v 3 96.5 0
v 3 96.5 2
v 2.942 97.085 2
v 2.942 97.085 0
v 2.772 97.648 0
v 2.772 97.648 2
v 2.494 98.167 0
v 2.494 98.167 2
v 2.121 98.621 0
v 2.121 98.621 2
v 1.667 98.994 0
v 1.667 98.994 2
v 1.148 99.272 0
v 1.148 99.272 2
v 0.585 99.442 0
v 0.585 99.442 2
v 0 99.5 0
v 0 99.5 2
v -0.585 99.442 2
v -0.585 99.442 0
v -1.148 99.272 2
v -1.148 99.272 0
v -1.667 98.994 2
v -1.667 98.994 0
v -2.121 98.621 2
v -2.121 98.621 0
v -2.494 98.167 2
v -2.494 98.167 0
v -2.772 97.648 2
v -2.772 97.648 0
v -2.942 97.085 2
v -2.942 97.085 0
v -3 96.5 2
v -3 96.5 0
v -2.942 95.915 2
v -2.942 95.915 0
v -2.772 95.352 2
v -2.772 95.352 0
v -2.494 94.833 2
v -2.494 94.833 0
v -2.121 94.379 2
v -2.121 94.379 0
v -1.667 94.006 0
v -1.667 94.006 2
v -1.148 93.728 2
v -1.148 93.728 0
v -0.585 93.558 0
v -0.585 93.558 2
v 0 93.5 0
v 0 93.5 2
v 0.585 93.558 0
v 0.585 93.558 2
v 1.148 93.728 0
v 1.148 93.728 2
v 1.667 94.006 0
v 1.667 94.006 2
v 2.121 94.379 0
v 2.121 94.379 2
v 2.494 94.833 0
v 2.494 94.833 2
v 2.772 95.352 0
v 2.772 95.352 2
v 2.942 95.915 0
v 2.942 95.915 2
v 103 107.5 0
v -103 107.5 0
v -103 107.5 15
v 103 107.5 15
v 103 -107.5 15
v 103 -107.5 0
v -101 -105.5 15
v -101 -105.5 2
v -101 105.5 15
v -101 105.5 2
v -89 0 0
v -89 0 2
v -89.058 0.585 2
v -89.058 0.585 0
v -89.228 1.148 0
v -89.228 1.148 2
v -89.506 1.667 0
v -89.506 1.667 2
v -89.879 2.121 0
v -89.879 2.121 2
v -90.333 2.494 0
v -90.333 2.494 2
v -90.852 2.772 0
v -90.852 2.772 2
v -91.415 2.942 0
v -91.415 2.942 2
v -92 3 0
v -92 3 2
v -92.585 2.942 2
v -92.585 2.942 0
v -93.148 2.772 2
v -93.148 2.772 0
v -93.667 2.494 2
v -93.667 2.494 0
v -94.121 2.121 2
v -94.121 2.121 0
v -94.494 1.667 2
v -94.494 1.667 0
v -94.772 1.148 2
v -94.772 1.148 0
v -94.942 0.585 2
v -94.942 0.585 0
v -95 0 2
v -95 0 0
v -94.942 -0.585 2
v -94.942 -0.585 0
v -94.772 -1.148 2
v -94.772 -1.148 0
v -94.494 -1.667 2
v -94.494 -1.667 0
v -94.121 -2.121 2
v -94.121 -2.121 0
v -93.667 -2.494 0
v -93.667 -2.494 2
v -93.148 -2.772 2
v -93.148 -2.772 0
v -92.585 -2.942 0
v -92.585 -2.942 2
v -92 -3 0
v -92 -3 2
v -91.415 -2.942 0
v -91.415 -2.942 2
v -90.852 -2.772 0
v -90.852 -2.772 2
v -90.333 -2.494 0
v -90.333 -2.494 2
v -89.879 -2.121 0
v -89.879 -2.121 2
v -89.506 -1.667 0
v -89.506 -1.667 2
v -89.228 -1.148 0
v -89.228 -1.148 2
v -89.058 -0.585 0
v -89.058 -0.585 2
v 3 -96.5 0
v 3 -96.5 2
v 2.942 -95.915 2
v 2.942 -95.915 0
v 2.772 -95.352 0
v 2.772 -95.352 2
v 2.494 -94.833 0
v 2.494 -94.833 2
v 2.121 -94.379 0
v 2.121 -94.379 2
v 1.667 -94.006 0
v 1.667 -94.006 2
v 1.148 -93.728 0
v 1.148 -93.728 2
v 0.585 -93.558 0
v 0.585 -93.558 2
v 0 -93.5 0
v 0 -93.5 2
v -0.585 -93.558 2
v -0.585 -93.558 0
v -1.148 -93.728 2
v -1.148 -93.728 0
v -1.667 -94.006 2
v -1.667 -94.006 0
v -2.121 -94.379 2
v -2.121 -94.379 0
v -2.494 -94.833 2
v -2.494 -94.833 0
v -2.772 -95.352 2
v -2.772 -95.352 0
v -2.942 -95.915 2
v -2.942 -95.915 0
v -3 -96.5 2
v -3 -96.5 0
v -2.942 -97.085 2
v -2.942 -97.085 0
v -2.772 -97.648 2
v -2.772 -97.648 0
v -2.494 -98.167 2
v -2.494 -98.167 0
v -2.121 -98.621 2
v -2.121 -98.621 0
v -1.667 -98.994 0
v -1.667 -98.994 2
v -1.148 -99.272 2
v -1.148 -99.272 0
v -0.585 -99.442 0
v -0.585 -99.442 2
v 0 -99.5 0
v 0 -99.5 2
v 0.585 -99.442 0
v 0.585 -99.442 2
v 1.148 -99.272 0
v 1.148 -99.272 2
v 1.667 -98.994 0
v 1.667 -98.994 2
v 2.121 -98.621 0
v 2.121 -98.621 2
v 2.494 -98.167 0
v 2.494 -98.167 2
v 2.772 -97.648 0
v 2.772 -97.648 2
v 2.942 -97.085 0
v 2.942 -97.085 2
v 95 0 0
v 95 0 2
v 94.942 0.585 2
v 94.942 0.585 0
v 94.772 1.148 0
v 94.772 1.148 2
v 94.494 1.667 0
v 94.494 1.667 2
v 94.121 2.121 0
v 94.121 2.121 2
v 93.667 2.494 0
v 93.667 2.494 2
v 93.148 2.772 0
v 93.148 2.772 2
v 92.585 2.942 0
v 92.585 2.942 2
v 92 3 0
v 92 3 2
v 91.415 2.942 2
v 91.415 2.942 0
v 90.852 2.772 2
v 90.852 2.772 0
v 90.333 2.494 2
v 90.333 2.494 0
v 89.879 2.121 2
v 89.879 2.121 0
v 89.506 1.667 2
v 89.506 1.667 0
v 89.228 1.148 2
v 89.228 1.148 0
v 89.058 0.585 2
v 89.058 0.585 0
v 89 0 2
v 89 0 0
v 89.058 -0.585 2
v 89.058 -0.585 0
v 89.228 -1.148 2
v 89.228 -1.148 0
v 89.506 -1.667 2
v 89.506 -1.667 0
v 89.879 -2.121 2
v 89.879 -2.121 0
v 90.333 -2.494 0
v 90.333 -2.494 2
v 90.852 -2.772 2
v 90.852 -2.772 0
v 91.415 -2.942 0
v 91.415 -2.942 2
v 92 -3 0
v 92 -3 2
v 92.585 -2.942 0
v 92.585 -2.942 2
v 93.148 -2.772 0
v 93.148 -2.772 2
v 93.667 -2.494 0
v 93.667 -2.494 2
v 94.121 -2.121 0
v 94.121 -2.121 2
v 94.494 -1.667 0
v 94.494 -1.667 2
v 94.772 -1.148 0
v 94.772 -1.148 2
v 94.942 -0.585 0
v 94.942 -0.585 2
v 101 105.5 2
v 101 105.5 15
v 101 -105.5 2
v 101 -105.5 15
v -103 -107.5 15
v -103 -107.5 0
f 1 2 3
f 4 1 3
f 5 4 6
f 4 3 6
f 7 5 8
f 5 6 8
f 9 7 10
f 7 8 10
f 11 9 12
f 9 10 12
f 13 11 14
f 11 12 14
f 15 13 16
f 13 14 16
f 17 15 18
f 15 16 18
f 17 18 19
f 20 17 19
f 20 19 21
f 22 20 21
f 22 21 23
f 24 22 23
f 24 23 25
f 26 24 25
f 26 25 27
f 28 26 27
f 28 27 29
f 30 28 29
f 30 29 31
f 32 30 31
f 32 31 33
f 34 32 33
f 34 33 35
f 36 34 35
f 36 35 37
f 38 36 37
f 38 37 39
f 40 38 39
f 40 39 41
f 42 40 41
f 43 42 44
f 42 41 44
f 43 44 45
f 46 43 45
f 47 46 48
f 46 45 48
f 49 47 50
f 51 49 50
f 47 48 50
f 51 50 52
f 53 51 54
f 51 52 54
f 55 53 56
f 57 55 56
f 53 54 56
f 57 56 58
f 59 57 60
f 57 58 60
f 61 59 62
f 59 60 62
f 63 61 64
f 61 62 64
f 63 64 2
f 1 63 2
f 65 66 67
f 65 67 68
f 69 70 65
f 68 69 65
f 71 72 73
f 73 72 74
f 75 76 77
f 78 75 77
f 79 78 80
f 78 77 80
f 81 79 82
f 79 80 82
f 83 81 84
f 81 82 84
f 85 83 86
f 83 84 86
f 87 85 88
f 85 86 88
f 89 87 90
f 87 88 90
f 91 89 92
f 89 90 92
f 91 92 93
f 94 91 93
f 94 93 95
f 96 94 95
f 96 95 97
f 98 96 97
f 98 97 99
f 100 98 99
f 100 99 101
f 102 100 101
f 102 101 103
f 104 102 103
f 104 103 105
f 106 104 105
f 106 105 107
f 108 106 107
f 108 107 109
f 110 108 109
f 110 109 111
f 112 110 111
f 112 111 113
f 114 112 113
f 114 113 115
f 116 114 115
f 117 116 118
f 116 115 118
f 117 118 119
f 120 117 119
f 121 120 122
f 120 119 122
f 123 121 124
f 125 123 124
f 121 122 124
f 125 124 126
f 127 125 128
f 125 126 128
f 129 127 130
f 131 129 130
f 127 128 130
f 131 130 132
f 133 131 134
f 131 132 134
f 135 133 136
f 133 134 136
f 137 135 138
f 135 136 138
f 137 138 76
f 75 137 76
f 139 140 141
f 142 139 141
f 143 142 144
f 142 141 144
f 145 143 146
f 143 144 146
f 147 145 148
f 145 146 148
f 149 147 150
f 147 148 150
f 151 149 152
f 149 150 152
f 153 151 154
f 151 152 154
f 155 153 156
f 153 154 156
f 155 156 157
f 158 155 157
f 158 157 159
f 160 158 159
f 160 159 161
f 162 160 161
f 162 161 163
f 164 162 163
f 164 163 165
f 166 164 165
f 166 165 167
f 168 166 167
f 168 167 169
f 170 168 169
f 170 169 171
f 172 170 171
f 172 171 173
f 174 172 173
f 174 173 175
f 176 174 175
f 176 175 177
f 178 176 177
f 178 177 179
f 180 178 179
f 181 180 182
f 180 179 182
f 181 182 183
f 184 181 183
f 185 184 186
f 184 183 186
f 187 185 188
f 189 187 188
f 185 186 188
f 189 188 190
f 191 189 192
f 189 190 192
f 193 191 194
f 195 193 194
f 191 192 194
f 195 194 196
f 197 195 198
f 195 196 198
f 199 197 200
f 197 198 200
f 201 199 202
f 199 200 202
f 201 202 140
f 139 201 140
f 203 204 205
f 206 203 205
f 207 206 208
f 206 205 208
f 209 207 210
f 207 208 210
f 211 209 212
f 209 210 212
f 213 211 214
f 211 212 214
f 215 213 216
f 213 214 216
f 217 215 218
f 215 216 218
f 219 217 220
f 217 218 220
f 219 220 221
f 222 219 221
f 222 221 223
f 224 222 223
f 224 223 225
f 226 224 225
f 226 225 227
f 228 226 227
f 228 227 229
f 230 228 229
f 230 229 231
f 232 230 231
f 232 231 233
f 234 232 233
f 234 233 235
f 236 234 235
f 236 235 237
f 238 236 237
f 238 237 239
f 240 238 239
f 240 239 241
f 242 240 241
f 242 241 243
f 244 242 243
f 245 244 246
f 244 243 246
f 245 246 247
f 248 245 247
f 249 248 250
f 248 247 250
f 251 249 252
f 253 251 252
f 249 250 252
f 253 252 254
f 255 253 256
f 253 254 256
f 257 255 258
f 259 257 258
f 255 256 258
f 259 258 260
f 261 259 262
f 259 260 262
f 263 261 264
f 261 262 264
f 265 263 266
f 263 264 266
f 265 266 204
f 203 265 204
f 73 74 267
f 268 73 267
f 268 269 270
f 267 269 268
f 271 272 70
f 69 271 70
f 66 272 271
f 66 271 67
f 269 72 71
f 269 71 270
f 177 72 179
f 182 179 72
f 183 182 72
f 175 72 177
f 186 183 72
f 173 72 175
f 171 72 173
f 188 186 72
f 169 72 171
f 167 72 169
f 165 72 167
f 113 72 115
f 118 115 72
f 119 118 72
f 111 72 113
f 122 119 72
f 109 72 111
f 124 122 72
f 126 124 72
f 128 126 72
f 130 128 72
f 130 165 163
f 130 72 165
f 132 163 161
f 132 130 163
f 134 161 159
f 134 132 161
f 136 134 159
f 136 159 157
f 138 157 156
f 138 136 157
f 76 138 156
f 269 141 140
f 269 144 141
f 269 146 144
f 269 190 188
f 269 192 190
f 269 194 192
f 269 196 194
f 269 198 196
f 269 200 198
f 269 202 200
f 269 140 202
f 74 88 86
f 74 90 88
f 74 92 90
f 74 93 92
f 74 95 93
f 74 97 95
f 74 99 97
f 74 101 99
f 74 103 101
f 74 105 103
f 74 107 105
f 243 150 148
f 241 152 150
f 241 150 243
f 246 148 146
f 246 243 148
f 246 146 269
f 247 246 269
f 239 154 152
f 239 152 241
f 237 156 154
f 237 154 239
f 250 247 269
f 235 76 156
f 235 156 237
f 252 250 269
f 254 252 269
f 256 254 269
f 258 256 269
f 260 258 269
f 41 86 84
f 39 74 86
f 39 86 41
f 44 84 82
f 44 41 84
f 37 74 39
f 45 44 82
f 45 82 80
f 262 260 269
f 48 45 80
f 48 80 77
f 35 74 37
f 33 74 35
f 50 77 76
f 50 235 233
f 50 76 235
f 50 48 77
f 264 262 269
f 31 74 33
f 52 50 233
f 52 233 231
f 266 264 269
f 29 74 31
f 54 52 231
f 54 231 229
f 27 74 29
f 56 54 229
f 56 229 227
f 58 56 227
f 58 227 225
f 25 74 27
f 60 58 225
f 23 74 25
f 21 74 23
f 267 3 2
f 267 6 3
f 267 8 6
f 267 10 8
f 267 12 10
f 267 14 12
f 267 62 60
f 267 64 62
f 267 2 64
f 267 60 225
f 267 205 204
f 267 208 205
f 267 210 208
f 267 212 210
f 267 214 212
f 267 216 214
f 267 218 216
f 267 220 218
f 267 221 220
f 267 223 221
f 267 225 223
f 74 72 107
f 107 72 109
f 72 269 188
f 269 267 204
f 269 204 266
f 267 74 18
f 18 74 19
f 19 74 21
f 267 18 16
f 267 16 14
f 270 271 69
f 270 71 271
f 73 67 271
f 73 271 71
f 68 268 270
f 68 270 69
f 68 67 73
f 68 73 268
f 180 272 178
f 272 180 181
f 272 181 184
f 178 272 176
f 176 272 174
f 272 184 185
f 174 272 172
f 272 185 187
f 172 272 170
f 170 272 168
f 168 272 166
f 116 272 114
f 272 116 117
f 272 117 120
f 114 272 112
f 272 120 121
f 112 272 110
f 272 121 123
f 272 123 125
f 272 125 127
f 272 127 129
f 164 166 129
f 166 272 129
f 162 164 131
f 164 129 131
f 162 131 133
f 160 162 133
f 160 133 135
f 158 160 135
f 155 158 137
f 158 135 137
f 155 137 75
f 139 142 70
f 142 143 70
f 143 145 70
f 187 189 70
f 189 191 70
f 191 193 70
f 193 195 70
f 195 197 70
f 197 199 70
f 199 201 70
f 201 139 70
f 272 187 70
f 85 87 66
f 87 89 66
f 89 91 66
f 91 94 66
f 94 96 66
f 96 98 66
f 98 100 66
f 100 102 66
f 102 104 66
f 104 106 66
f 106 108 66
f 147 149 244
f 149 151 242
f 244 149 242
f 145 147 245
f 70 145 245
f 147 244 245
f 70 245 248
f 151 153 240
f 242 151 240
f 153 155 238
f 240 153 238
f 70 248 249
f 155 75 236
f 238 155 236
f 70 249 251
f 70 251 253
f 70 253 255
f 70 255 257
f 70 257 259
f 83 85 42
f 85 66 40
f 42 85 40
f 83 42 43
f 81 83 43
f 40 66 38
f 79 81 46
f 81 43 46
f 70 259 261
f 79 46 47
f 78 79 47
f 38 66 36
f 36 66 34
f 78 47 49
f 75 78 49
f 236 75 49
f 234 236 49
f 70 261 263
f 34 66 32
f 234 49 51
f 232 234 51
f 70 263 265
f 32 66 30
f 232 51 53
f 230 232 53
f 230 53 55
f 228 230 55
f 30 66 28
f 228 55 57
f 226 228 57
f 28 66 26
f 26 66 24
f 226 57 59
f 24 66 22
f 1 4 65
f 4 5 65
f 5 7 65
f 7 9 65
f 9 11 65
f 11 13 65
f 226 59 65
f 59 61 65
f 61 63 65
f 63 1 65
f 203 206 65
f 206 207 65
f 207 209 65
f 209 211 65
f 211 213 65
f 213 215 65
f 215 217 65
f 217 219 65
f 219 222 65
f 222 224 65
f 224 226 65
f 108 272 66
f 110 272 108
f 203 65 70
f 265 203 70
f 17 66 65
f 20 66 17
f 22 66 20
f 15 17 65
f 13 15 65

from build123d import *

# Parameters (mm, degrees)
SKETCH_1_W          = 206
SKETCH_1_H          = 215
EXTRUDE_1_DEPTH     = 15
SHELL_1_T           = -2
SKETCH_2_R          = 3
CUT_EXTRUDE_1_DEPTH = 15


with BuildPart() as part:
    # 草图1 → 凸台-拉伸1 (new body)
    with BuildSketch(Plane.XY):
        Rectangle(SKETCH_1_W, SKETCH_1_H)
    extrude(amount=EXTRUDE_1_DEPTH)

    # 抽壳1
    shell_1_openings = [part.faces().sort_by_distance(p)[0] for p in [
        (0, 0, 15),
    ]]
    offset(amount=SHELL_1_T, openings=shell_1_openings, kind=Kind.INTERSECTION)

    # 草图2 → 切除-拉伸1 (cut)
    with BuildSketch(Plane.XY.offset(2)):
        with Locations((-92, 0)):
            Circle(SKETCH_2_R)
        with Locations((0, 96.5)):
            Circle(SKETCH_2_R)
        with Locations((92, 0)):
            Circle(SKETCH_2_R)
        with Locations((0, -96.5)):
            Circle(SKETCH_2_R)
    extrude(amount=-CUT_EXTRUDE_1_DEPTH, mode=Mode.SUBTRACT)


solid = part.part
